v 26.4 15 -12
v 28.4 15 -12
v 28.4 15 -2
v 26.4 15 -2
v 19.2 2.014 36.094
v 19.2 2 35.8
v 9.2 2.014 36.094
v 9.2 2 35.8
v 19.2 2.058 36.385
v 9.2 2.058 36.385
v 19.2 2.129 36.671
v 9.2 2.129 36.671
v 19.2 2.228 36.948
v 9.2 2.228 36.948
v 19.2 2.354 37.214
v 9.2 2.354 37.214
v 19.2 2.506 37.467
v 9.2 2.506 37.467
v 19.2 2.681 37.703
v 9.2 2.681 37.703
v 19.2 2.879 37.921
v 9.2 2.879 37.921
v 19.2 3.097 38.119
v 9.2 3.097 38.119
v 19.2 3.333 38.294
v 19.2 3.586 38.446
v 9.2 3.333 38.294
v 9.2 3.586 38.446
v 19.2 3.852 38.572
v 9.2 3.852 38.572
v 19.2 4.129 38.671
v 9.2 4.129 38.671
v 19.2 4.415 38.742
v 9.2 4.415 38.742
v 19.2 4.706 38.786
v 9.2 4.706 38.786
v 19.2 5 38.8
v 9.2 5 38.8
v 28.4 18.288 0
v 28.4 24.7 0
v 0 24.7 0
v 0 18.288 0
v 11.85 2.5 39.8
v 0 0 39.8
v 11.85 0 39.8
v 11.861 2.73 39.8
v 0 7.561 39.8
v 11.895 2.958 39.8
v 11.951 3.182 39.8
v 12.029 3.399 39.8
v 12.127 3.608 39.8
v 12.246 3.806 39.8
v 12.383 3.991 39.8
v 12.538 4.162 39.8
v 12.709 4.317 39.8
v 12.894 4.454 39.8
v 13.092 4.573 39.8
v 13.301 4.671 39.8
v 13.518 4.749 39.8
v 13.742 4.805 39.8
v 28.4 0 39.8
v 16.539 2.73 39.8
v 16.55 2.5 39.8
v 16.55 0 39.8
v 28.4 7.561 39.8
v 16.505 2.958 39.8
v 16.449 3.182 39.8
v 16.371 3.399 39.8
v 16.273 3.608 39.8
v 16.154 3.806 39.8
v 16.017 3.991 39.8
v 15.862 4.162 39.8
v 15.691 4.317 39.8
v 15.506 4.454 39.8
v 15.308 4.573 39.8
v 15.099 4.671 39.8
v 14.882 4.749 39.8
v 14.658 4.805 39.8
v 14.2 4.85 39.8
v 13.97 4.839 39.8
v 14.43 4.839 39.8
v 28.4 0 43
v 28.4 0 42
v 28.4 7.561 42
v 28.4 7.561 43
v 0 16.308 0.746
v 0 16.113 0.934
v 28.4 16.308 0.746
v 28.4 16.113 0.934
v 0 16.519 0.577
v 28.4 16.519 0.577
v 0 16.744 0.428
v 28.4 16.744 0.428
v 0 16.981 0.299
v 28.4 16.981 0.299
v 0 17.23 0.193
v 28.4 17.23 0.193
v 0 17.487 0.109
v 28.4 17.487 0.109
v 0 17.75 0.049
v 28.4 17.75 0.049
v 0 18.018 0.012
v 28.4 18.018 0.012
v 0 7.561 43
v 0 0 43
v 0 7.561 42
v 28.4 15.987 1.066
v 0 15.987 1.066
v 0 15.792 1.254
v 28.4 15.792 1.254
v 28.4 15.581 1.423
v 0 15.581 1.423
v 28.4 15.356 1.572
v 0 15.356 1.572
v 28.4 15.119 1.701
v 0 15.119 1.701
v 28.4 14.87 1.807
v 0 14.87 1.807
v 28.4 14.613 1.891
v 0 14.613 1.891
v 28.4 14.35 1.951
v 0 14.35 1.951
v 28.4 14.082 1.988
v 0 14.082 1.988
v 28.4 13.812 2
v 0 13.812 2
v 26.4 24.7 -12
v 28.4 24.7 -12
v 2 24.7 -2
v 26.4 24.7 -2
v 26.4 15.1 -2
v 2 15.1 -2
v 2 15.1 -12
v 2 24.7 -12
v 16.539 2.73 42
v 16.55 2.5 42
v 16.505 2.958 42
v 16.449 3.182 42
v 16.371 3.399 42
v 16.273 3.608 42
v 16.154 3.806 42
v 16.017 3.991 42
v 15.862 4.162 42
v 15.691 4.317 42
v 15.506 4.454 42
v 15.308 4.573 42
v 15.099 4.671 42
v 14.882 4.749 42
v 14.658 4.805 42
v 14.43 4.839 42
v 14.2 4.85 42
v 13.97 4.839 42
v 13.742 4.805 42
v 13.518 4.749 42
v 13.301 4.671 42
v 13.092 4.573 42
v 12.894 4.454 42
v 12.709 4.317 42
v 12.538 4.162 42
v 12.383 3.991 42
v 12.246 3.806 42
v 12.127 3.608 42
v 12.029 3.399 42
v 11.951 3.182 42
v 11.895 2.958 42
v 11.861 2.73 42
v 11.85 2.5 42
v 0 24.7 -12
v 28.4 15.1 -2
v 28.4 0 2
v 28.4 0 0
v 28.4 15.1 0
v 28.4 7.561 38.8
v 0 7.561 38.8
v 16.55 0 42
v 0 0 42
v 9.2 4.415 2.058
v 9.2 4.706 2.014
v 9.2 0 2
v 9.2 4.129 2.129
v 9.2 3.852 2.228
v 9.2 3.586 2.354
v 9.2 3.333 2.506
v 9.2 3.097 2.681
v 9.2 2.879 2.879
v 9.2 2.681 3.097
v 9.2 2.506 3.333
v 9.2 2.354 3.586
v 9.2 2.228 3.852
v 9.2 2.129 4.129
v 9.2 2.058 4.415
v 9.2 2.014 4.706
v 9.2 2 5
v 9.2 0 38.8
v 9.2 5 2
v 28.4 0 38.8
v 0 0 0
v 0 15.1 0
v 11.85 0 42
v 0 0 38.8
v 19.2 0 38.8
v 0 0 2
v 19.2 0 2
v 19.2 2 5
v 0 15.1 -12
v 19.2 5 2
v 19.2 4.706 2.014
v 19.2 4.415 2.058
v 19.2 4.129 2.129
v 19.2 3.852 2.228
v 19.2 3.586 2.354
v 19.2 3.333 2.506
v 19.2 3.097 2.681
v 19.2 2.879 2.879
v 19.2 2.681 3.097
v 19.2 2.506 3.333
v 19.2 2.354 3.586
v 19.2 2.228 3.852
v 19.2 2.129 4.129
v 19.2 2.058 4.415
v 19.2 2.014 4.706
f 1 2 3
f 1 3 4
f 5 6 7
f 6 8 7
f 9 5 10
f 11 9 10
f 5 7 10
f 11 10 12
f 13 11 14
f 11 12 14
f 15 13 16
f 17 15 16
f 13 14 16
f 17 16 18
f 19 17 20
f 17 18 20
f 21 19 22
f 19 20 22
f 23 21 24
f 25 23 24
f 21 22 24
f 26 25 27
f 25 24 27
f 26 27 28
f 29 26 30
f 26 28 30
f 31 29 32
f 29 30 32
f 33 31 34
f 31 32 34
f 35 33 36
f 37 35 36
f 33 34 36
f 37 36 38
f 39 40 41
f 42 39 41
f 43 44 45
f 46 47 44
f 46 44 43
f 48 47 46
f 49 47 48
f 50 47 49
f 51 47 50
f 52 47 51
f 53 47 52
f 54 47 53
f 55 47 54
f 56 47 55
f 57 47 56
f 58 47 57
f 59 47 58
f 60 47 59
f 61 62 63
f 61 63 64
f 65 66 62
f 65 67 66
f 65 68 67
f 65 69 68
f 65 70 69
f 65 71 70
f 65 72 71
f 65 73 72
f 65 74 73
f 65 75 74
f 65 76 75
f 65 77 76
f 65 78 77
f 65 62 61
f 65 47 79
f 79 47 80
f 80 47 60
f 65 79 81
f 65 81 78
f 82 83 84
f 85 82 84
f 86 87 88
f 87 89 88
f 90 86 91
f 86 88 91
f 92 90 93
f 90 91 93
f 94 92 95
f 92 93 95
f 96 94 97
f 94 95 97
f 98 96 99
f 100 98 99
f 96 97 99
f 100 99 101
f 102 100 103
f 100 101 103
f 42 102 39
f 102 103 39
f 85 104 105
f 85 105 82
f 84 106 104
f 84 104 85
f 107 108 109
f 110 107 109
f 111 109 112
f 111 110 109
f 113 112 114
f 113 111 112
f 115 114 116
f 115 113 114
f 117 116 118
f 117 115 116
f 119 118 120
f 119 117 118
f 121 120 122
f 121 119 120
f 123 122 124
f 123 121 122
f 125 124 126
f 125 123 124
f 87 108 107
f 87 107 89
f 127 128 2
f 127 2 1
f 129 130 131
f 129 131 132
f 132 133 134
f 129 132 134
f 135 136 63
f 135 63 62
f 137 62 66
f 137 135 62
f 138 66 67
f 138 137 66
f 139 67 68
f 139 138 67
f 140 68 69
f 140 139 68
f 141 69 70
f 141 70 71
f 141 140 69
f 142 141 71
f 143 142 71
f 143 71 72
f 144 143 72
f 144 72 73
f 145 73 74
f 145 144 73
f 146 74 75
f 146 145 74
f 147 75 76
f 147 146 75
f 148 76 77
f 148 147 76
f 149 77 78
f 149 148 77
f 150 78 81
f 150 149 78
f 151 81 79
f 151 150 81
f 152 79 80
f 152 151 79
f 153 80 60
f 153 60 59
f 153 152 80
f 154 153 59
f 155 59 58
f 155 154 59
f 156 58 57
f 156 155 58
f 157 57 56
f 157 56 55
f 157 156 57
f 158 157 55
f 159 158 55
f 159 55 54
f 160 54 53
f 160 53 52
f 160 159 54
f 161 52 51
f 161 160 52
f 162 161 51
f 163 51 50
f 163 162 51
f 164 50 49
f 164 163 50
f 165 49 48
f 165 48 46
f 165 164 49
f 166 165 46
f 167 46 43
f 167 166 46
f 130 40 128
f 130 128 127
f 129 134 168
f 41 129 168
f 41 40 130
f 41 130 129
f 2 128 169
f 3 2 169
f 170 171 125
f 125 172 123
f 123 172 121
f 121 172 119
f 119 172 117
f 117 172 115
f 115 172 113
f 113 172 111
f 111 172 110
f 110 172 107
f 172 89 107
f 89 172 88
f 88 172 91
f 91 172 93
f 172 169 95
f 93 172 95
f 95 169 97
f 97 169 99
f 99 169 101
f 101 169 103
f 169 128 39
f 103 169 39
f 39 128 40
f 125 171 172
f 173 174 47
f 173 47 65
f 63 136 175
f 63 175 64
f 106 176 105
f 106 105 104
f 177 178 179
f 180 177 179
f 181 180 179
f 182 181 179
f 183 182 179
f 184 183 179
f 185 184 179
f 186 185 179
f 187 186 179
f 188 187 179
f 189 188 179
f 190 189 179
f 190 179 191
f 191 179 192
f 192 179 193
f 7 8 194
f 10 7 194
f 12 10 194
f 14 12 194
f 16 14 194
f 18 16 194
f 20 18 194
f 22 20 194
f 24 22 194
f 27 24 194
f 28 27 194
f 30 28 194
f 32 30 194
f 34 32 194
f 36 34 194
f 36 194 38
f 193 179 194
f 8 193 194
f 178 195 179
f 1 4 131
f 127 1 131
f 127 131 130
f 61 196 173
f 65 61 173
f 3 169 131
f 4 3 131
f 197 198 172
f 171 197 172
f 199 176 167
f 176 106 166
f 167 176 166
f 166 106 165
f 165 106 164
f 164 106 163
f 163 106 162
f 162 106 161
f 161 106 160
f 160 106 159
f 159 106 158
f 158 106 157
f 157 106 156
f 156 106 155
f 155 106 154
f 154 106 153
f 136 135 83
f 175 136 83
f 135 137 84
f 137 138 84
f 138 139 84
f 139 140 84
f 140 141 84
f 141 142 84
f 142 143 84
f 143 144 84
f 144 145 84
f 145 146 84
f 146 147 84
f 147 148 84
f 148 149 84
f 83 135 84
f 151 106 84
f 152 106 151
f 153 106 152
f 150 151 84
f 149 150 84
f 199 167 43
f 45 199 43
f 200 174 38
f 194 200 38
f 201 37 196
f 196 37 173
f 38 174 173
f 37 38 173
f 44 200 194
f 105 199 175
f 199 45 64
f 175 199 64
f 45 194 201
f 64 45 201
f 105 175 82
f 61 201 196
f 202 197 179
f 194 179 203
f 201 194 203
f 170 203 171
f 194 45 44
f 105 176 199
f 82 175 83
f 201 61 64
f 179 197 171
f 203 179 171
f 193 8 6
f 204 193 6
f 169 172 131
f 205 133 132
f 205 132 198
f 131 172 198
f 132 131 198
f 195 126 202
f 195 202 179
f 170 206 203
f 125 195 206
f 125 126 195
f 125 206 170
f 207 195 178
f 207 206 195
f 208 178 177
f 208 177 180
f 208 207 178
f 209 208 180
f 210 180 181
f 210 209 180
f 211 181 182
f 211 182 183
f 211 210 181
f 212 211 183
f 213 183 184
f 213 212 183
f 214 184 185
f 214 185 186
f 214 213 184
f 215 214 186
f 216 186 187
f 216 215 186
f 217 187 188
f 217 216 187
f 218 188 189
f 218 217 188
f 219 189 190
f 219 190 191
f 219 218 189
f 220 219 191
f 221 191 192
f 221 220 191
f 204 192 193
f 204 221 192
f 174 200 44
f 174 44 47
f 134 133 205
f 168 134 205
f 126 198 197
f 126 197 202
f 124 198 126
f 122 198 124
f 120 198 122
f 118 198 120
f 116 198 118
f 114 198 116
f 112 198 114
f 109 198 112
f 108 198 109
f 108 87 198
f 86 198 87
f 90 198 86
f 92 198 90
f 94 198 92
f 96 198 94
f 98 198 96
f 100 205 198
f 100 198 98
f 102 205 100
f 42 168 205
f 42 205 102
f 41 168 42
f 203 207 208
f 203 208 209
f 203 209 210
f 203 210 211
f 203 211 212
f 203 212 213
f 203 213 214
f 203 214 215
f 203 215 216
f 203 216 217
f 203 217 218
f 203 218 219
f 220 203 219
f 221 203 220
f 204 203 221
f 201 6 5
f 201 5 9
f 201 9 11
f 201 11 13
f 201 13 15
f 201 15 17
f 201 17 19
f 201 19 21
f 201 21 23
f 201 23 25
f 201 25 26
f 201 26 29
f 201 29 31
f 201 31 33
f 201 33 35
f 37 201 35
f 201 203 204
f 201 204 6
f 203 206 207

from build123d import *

# Parameters (mm, degrees)
ESQUISSE1_W                = 28.4
ESQUISSE1_H                = 15.1
BOSS_EXTRU_1_DEPTH         = 2
ESQUISSE2_W                = 28.4
ESQUISSE2_H                = 9.6
BOSS_EXTRU_2_DEPTH         = 2
ESQUISSE3_W                = 2
ESQUISSE3_H                = 9.6
ESQUISSE3_H_2              = 9.7
BOSS_EXTRU_3_DEPTH         = 10
ESQUISSE4_W                = 10
ESQUISSE4_H                = 40
BOSS_EXTRU_4_DEPTH         = 2
BOSS_EXTRU_5_DEPTH         = 2.2
ESQUISSE6_W                = 28.4
ESQUISSE6_H                = 7.560696408
BOSS_EXTRU_6_DEPTH         = 1
R_P_TITION_LIN_AIRE1_COUNT = 2
R_P_TITION_LIN_AIRE1_PITCH = 3.2
ESQUISSE7_W                = 2.65
ESQUISSE7_H                = 2.2
ENL_V_MAT_EXTRU_1_DEPTH    = 57.310301011
BOSS_EXTRU_7_DEPTH         = 28.4
CONG_1_R                   = 3


with BuildPart() as part:
    # Esquisse1 → Boss.-Extru.1 (new body)
    with BuildSketch(Plane.XY):
        with Locations((14.2, 7.55)):
            Rectangle(ESQUISSE1_W, ESQUISSE1_H)
    extrude(amount=BOSS_EXTRU_1_DEPTH)

    # Esquisse4 → Boss.-Extru.4 (add)
    with BuildSketch(Plane.XZ):
        with Locations((14.2, 22)):
            Rectangle(ESQUISSE4_W, ESQUISSE4_H)
    extrude(amount=-BOSS_EXTRU_4_DEPTH)

    # Esquisse5 → Boss.-Extru.5 (add)
    with BuildSketch(Plane.XY.offset(42)):
        with BuildLine():
            Line((11.85, 2.5), (11.85, 2))
            Line((11.85, 2), (16.55, 2))
            Line((16.55, 2), (16.55, 2.5))
            ThreePointArc((16.55, 2.5), (14.2, 4.85), (11.85, 2.5))
        make_face()
    extrude(amount=-BOSS_EXTRU_5_DEPTH)

    # Esquisse6 → Boss.-Extru.6 (add)
    with BuildSketch(Plane.XY.offset(42)):
        with Locations((14.2, 3.780348204)):
            Rectangle(ESQUISSE6_W, ESQUISSE6_H)
    boss_extru_6 = extrude(amount=BOSS_EXTRU_6_DEPTH)

    # Répétition linéaire1: Boss.-Extru.6 ×2
    with Locations(*[(0, 0, -i * R_P_TITION_LIN_AIRE1_PITCH) for i in range(1, R_P_TITION_LIN_AIRE1_COUNT)]):
        add(boss_extru_6)

    # Esquisse7 → Enlèv. mat.-Extru.1 (cut, through all)
    with BuildSketch(Plane(origin=(0, 2, 0), x_dir=(1, 0, 0), z_dir=(0, 1, 0))):
        with Locations((17.875, -40.9)):
            Rectangle(ESQUISSE7_W, ESQUISSE7_H)
        with Locations((10.525, -40.9)):
            Rectangle(ESQUISSE7_W, ESQUISSE7_H)
    extrude(amount=-ENL_V_MAT_EXTRU_1_DEPTH, mode=Mode.SUBTRACT)



with BuildPart() as body_2:
    # Esquisse2 → Boss.-Extru.2 (new body)
    with BuildSketch(Plane(origin=(0, 0, 0), x_dir=(-1, 0, 0), z_dir=(0, 0, -1))):
        with Locations((-14.2, 19.9)):
            Rectangle(ESQUISSE2_W, ESQUISSE2_H)
    extrude(amount=BOSS_EXTRU_2_DEPTH)

    # Esquisse3 → Boss.-Extru.3 (add)
    with BuildSketch(Plane(origin=(0, 0, -2), x_dir=(-1, 0, 0), z_dir=(0, 0, -1))):
        with Locations((-1, 19.9)):
            Rectangle(ESQUISSE3_W, ESQUISSE3_H)
        with Locations((-27.4, 19.85)):
            Rectangle(ESQUISSE3_W, ESQUISSE3_H_2)
    extrude(amount=BOSS_EXTRU_3_DEPTH)


with BuildPart() as part_1:
    add(part.part)

    add(body_2.part)  # Boss.-Extru.7 merges body 2
    # Esquisse9 → Boss.-Extru.7 (add)
    with BuildSketch(Plane.ZY):
        Polygon((0, 15.1), (2, 15.1), (0, 17), align=None)
    extrude(amount=-BOSS_EXTRU_7_DEPTH)

    # Congé1
    cong_1_edges = [part_1.edges().sort_by_distance(p)[0] for p in [
        (14.2, 17, 0),
        (14.2, 15.1, 2),
        (14.2, 2, 2),
        (14.2, 2, 38.8),
    ]]
    fillet(cong_1_edges, radius=CONG_1_R)


solid = part_1.part
